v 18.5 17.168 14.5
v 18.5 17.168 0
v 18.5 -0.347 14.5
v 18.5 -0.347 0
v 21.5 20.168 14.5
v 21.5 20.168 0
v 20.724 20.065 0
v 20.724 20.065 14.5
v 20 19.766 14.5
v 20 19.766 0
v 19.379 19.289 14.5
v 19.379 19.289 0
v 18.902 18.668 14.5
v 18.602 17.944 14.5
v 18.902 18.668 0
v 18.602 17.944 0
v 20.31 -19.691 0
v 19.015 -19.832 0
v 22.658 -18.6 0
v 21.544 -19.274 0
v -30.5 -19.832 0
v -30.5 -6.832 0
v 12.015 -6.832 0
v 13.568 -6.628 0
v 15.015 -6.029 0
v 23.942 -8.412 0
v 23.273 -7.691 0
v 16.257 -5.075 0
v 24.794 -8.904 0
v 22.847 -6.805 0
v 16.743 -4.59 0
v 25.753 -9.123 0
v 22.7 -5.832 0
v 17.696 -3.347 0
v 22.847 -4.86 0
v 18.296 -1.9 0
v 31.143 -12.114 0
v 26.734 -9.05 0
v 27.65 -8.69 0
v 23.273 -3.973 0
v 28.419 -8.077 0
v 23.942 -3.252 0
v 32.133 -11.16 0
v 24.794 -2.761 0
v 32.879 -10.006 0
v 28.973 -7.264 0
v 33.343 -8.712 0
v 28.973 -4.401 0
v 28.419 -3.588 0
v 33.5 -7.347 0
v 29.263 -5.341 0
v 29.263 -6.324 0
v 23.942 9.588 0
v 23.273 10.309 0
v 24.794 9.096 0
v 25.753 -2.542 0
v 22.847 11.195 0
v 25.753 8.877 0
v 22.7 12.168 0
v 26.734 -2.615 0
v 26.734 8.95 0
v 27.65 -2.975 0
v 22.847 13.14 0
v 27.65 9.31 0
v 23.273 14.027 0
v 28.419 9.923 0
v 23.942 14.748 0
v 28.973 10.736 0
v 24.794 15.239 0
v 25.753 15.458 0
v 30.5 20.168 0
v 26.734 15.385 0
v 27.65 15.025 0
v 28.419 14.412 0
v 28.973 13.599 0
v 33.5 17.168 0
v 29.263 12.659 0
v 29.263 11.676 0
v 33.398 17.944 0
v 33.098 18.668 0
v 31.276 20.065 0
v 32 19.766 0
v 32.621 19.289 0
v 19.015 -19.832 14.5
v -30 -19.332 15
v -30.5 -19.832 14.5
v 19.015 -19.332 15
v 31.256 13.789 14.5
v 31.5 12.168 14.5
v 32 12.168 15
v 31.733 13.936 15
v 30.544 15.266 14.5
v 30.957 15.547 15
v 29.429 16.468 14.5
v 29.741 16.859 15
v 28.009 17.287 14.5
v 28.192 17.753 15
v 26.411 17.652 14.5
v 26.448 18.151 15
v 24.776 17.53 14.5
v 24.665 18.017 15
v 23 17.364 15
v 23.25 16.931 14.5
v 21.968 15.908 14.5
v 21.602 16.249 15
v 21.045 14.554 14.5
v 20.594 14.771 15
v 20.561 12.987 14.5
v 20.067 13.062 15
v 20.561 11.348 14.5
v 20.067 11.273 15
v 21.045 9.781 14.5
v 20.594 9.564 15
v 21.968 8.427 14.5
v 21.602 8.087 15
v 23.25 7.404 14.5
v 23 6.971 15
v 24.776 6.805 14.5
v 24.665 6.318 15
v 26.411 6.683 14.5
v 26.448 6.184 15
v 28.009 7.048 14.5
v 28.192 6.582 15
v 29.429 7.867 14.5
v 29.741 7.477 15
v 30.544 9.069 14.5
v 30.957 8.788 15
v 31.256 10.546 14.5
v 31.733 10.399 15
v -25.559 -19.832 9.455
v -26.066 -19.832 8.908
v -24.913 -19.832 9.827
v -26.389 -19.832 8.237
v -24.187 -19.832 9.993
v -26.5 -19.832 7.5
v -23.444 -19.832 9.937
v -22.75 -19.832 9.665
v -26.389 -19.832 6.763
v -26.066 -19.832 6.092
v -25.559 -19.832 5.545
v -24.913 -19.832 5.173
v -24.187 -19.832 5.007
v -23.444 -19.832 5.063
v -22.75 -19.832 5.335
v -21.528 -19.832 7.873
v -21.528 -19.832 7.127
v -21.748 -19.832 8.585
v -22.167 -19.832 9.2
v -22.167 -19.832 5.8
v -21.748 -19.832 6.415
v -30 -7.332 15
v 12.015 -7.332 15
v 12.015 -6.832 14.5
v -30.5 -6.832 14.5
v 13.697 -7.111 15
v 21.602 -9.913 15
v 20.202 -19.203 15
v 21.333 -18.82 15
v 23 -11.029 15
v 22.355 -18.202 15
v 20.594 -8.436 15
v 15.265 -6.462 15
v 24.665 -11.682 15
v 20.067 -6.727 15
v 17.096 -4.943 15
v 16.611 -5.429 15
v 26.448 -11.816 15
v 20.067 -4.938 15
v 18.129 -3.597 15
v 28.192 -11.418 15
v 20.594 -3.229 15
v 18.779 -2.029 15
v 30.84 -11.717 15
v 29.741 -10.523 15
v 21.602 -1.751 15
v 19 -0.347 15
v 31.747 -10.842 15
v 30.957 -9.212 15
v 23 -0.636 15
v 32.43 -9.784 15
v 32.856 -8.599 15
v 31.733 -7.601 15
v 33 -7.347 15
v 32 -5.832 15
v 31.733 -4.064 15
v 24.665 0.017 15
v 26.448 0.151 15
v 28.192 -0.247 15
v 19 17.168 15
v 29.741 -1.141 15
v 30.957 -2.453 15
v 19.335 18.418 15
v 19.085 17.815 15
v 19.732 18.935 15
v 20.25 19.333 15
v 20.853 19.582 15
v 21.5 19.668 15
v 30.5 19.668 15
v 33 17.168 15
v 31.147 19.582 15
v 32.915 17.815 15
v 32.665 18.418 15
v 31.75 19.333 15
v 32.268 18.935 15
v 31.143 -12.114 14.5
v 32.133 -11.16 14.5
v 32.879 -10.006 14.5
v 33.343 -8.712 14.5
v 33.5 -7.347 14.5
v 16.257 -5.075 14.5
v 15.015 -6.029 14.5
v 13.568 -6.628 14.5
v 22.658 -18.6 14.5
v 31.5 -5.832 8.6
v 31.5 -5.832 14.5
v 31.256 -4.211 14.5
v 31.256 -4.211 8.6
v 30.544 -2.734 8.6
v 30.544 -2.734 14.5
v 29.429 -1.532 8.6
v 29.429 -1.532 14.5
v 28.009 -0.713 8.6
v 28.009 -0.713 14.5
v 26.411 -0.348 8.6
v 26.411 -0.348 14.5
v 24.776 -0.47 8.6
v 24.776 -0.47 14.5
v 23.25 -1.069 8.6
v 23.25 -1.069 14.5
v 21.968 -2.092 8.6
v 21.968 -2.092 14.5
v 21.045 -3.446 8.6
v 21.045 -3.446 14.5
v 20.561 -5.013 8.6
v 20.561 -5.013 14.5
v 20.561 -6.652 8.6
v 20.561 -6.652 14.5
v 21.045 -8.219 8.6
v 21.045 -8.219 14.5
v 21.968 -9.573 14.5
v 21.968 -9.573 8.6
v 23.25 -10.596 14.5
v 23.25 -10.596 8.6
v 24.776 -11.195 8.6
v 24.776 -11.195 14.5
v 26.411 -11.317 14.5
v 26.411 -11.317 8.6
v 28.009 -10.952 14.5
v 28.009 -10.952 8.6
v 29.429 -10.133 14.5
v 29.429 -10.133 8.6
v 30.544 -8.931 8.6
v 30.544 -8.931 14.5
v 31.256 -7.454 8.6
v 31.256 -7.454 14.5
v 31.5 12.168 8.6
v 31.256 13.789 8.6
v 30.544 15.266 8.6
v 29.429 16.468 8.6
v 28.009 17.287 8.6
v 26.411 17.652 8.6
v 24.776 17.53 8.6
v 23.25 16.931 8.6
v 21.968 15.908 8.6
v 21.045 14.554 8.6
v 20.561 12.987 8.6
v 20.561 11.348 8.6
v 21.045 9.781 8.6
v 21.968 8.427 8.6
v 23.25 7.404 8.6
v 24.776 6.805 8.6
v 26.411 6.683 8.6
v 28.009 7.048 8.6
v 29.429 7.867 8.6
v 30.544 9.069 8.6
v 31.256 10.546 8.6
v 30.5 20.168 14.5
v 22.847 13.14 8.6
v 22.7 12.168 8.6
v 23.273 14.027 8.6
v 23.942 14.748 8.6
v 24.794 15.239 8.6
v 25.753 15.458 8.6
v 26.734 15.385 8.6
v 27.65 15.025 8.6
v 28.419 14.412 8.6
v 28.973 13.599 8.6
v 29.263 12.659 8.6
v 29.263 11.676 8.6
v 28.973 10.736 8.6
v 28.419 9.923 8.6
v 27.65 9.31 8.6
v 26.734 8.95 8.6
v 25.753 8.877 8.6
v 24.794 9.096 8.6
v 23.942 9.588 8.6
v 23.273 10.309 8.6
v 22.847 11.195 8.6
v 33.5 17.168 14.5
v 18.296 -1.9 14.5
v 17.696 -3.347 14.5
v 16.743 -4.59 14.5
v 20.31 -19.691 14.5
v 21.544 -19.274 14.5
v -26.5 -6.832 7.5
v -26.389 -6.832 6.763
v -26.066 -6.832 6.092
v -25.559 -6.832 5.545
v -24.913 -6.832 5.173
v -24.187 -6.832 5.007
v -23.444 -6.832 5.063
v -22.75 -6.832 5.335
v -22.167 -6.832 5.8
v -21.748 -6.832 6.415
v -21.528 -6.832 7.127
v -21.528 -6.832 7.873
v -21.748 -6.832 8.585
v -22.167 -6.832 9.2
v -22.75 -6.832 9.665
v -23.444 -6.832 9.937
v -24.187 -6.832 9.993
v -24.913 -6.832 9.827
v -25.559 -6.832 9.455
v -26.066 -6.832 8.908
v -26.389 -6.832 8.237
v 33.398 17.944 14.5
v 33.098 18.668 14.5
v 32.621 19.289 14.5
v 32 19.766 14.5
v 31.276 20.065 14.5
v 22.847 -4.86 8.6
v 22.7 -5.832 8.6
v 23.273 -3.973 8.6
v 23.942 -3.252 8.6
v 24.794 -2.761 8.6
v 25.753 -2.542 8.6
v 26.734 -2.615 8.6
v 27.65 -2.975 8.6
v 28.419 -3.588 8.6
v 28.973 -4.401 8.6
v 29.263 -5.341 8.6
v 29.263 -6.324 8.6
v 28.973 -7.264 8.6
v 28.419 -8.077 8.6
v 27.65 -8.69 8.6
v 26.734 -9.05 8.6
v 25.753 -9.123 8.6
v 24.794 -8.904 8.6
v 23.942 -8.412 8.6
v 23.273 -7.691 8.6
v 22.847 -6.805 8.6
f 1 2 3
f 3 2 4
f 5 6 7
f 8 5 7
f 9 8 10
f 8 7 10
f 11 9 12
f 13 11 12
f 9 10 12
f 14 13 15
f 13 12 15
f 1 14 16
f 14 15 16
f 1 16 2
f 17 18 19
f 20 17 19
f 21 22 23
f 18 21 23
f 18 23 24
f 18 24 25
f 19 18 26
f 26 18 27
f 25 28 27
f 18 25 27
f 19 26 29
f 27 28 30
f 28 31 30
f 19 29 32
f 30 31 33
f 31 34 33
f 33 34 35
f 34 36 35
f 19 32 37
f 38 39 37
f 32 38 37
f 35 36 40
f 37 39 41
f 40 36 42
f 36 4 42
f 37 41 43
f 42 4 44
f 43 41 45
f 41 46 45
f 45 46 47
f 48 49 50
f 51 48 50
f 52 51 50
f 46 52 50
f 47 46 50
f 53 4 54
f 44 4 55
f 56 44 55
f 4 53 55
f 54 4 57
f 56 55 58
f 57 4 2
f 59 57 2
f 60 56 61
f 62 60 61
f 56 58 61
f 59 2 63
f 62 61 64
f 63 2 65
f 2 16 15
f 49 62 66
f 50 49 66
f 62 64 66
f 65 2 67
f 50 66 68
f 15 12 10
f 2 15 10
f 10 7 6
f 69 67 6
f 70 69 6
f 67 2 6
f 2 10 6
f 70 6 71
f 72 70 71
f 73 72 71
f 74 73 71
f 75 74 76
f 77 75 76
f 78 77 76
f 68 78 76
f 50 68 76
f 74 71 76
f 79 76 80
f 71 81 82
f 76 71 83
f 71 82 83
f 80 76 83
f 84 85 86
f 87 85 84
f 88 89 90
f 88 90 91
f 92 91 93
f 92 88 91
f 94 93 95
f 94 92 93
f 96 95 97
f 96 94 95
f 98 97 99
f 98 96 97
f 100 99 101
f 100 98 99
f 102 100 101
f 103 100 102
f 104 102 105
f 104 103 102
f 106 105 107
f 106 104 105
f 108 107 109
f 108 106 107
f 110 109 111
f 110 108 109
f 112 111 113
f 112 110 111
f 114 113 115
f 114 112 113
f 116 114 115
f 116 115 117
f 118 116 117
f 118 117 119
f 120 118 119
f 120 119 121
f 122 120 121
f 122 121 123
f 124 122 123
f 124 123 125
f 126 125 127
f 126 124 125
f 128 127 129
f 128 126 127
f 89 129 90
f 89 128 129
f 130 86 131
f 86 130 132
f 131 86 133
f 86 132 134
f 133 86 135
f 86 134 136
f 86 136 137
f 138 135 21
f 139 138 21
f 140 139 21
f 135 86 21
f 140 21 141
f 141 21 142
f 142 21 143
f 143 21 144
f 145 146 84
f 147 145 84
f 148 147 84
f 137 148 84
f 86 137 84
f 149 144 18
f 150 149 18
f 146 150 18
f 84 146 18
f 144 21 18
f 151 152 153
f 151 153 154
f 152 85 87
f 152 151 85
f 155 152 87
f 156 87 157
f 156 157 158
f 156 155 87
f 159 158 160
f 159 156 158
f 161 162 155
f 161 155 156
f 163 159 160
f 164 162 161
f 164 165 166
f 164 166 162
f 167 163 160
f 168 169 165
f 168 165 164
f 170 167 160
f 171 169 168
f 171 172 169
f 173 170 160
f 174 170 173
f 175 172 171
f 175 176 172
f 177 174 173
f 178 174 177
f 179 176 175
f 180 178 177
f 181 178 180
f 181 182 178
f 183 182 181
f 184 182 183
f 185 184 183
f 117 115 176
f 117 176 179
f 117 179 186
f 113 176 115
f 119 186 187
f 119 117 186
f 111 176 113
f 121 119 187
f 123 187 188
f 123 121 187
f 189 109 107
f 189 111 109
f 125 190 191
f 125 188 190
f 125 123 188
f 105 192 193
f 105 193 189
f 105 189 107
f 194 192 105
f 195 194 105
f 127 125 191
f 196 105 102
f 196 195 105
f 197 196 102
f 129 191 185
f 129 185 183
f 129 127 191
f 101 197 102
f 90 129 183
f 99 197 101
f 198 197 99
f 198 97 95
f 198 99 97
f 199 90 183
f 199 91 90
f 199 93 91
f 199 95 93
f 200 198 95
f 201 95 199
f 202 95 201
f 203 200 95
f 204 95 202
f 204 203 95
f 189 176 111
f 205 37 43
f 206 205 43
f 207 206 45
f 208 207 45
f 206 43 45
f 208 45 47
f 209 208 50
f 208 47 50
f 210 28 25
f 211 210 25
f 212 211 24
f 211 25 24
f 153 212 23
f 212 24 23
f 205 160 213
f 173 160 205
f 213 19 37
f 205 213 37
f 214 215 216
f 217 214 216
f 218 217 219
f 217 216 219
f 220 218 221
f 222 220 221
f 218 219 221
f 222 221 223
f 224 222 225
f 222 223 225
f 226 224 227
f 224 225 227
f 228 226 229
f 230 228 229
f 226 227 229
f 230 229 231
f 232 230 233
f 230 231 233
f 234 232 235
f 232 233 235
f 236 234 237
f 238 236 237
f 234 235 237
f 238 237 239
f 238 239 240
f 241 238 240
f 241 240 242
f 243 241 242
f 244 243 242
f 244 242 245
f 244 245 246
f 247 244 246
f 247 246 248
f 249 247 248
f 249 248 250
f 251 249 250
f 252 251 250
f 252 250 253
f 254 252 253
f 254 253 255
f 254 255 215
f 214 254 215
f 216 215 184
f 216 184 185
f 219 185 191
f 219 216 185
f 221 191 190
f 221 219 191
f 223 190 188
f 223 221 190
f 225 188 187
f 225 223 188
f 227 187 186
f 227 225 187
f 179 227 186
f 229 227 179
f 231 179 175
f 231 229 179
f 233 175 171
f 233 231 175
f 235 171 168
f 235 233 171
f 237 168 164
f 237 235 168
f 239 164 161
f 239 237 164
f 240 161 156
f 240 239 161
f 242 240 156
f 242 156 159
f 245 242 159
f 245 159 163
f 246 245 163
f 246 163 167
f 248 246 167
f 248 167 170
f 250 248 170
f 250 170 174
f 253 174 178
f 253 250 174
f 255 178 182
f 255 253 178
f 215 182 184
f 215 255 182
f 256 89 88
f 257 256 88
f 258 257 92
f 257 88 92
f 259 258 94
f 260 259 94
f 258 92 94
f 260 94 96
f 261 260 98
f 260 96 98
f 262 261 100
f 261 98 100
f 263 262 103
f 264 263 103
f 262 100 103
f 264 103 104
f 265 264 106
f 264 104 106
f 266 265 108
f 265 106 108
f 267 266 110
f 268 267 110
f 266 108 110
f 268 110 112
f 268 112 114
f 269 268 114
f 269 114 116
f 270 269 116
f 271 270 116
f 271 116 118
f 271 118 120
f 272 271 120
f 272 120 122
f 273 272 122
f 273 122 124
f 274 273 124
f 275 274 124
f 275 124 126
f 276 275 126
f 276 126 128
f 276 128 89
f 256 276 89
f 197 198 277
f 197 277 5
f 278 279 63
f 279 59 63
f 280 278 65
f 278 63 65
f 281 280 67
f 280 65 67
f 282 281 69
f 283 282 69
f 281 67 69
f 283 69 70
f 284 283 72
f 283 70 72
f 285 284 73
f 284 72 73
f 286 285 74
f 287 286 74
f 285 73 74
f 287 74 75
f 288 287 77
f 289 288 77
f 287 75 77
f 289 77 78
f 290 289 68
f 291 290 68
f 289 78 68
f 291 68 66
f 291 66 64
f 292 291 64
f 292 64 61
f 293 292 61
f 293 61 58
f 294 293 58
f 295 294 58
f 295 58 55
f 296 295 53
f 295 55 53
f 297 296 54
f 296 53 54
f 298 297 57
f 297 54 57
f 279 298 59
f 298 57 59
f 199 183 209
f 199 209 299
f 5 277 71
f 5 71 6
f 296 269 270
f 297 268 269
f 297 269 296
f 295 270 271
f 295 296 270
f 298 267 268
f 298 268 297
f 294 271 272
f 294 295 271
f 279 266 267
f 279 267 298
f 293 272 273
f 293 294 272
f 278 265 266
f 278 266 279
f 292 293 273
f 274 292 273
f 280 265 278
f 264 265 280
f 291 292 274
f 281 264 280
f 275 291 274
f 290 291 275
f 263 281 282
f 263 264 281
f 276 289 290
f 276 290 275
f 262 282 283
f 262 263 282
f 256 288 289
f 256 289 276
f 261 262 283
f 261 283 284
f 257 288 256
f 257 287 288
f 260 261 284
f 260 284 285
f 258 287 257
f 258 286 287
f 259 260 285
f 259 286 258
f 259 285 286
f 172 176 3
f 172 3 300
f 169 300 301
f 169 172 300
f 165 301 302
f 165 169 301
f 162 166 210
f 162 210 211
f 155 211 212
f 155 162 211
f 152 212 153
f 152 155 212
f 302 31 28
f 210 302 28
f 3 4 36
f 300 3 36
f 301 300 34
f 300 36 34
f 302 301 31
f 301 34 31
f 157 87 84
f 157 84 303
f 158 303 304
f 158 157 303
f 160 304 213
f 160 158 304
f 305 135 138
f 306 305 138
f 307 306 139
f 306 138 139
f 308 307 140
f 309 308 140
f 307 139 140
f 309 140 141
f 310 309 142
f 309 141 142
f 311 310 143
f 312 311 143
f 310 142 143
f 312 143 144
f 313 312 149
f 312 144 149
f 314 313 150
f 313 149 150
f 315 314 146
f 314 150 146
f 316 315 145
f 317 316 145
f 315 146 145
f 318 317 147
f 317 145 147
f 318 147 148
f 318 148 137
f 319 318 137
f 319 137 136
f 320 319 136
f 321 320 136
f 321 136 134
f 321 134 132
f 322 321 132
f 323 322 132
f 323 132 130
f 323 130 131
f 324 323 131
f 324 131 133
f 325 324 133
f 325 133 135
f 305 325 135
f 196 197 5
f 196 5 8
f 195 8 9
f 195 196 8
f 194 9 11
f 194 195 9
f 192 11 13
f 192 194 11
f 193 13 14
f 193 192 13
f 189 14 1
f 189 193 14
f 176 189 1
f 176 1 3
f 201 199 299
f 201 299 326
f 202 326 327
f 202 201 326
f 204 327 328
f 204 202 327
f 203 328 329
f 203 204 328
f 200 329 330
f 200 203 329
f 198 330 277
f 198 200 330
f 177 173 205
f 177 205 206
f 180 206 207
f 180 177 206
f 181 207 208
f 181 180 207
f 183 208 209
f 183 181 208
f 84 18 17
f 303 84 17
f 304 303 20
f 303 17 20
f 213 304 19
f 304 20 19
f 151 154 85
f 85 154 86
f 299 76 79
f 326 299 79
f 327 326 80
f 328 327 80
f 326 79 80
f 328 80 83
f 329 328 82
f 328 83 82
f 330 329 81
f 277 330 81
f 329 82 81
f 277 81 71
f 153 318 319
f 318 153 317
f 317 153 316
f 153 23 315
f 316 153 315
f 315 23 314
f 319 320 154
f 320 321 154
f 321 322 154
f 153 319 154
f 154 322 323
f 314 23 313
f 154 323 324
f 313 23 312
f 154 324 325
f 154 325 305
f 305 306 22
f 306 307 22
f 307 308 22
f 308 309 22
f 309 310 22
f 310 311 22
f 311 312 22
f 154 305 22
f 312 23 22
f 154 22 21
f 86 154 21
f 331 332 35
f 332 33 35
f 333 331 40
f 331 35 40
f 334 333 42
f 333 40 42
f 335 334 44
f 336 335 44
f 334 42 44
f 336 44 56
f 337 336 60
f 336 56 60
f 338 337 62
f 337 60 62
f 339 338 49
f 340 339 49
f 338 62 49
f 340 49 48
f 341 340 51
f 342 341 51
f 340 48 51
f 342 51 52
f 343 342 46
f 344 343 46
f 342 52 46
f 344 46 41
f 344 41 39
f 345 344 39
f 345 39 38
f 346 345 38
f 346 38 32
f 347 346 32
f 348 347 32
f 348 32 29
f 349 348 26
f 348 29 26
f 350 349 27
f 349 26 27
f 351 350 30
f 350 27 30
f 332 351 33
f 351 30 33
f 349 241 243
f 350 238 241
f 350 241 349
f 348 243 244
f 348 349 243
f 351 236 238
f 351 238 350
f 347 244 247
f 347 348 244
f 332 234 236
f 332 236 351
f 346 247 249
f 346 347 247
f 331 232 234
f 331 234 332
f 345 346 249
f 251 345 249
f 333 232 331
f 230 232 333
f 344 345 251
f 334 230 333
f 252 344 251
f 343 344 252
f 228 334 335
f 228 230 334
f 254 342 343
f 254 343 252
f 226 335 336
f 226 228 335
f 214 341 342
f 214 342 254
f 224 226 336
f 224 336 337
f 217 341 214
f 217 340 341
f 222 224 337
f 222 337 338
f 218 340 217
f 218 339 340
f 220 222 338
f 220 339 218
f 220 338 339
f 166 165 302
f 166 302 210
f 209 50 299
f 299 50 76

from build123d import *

# Parameters (mm, degrees)
BOSS_EXTRUDE1_DEPTH                                 = 15
CBORE_FOR_M6_HEX_SOCKET_HEAD_CAP_SCREW1_D           = 6.6
CBORE_FOR_M6_HEX_SOCKET_HEAD_CAP_SCREW1_CBORE_D     = 11
CBORE_FOR_M6_HEX_SOCKET_HEAD_CAP_SCREW1_CBORE_DEPTH = 6.4
TAP_DRILL_FOR_M6_TAP1_D                             = 5
CHAMFER1_SIZE                                       = 0.5


with BuildPart() as part:
    # Sketch1 → Boss-Extrude1 (new body)
    with BuildSketch(Plane.XY):
        with BuildLine():
            Line((22.658191436, -18.599539786), (31.14347281, -12.114258412))
            ThreePointArc((31.14347281, -12.114258412), (32.878700441, -10.006041207), (33.5, -7.347172731))
            Line((33.5, -7.347172731), (33.5, 17.167545894))
            ThreePointArc((33.5, 17.167545894), (32.621320344, 19.288866238), (30.5, 20.167545894))
            Line((30.5, 20.167545894), (21.5, 20.167545894))
            ThreePointArc((21.5, 20.167545894), (19.378679656, 19.288866238), (18.5, 17.167545894))
            Line((18.5, 17.167545894), (18.5, -0.347172731))
            ThreePointArc((18.5, -0.347172731), (18.043277195, -2.643273326), (16.742640687, -4.589813418))
            Line((16.742640687, -4.589813418), (16.257359313, -5.075094793))
            ThreePointArc((16.257359313, -5.075094793), (14.31081922, -6.375731301), (12.014718626, -6.832454106))
            Line((12.014718626, -6.832454106), (-30.5, -6.832454106))
            Line((-30.5, -6.832454106), (-30.5, -19.832454106))
            Line((-30.5, -19.832454106), (19.014718626, -19.832454106))
            ThreePointArc((19.014718626, -19.832454106), (20.937930252, -19.51587359), (22.658191436, -18.599539786))
        make_face()
    extrude(amount=BOSS_EXTRUDE1_DEPTH)

    # CBORE for M6 Hex Socket Head Cap Screw1 (through all)
    with Locations(Plane.XY.offset(15)):
        with Locations((26, 12.167545894), (26, -5.832454106)):
            CounterBoreHole(CBORE_FOR_M6_HEX_SOCKET_HEAD_CAP_SCREW1_D / 2, CBORE_FOR_M6_HEX_SOCKET_HEAD_CAP_SCREW1_CBORE_D / 2, CBORE_FOR_M6_HEX_SOCKET_HEAD_CAP_SCREW1_CBORE_DEPTH)

    # Tap Drill for M6 Tap1 (through all)
    with Locations(Plane(origin=(0, -6.832454106, 0), x_dir=(1, 0, 0), z_dir=(0, 1, 0))):
        with Locations((-24, -7.5)):
            Hole(TAP_DRILL_FOR_M6_TAP1_D / 2)

    # Chamfer1
    chamfer1_edges = [part.edges().sort_by_distance(p)[0] for p in [
        (20.937930252, -19.51587359, 15),
        (26.900832123, -15.356899099, 15),
        (32.878700441, -10.006041207, 15),
        (33.5, 4.910186582, 15),
        (32.621320344, 19.288866238, 15),
        (26, 20.167545894, 15),
        (19.378679656, 19.288866238, 15),
        (18.5, 8.410186582, 15),
        (18.043277195, -2.643273326, 15),
        (16.5, -4.832454106, 15),
        (-30.5, -13.332454106, 15),
        (14.31081922, -6.375731301, 15),
        (20.5, -5.832454106, 15),
        (-9.242640687, -6.832454106, 15),
        (20.5, 12.167545894, 15),
        (-5.742640687, -19.832454106, 15),
    ]]
    chamfer(chamfer1_edges, length=CHAMFER1_SIZE)


solid = part.part
